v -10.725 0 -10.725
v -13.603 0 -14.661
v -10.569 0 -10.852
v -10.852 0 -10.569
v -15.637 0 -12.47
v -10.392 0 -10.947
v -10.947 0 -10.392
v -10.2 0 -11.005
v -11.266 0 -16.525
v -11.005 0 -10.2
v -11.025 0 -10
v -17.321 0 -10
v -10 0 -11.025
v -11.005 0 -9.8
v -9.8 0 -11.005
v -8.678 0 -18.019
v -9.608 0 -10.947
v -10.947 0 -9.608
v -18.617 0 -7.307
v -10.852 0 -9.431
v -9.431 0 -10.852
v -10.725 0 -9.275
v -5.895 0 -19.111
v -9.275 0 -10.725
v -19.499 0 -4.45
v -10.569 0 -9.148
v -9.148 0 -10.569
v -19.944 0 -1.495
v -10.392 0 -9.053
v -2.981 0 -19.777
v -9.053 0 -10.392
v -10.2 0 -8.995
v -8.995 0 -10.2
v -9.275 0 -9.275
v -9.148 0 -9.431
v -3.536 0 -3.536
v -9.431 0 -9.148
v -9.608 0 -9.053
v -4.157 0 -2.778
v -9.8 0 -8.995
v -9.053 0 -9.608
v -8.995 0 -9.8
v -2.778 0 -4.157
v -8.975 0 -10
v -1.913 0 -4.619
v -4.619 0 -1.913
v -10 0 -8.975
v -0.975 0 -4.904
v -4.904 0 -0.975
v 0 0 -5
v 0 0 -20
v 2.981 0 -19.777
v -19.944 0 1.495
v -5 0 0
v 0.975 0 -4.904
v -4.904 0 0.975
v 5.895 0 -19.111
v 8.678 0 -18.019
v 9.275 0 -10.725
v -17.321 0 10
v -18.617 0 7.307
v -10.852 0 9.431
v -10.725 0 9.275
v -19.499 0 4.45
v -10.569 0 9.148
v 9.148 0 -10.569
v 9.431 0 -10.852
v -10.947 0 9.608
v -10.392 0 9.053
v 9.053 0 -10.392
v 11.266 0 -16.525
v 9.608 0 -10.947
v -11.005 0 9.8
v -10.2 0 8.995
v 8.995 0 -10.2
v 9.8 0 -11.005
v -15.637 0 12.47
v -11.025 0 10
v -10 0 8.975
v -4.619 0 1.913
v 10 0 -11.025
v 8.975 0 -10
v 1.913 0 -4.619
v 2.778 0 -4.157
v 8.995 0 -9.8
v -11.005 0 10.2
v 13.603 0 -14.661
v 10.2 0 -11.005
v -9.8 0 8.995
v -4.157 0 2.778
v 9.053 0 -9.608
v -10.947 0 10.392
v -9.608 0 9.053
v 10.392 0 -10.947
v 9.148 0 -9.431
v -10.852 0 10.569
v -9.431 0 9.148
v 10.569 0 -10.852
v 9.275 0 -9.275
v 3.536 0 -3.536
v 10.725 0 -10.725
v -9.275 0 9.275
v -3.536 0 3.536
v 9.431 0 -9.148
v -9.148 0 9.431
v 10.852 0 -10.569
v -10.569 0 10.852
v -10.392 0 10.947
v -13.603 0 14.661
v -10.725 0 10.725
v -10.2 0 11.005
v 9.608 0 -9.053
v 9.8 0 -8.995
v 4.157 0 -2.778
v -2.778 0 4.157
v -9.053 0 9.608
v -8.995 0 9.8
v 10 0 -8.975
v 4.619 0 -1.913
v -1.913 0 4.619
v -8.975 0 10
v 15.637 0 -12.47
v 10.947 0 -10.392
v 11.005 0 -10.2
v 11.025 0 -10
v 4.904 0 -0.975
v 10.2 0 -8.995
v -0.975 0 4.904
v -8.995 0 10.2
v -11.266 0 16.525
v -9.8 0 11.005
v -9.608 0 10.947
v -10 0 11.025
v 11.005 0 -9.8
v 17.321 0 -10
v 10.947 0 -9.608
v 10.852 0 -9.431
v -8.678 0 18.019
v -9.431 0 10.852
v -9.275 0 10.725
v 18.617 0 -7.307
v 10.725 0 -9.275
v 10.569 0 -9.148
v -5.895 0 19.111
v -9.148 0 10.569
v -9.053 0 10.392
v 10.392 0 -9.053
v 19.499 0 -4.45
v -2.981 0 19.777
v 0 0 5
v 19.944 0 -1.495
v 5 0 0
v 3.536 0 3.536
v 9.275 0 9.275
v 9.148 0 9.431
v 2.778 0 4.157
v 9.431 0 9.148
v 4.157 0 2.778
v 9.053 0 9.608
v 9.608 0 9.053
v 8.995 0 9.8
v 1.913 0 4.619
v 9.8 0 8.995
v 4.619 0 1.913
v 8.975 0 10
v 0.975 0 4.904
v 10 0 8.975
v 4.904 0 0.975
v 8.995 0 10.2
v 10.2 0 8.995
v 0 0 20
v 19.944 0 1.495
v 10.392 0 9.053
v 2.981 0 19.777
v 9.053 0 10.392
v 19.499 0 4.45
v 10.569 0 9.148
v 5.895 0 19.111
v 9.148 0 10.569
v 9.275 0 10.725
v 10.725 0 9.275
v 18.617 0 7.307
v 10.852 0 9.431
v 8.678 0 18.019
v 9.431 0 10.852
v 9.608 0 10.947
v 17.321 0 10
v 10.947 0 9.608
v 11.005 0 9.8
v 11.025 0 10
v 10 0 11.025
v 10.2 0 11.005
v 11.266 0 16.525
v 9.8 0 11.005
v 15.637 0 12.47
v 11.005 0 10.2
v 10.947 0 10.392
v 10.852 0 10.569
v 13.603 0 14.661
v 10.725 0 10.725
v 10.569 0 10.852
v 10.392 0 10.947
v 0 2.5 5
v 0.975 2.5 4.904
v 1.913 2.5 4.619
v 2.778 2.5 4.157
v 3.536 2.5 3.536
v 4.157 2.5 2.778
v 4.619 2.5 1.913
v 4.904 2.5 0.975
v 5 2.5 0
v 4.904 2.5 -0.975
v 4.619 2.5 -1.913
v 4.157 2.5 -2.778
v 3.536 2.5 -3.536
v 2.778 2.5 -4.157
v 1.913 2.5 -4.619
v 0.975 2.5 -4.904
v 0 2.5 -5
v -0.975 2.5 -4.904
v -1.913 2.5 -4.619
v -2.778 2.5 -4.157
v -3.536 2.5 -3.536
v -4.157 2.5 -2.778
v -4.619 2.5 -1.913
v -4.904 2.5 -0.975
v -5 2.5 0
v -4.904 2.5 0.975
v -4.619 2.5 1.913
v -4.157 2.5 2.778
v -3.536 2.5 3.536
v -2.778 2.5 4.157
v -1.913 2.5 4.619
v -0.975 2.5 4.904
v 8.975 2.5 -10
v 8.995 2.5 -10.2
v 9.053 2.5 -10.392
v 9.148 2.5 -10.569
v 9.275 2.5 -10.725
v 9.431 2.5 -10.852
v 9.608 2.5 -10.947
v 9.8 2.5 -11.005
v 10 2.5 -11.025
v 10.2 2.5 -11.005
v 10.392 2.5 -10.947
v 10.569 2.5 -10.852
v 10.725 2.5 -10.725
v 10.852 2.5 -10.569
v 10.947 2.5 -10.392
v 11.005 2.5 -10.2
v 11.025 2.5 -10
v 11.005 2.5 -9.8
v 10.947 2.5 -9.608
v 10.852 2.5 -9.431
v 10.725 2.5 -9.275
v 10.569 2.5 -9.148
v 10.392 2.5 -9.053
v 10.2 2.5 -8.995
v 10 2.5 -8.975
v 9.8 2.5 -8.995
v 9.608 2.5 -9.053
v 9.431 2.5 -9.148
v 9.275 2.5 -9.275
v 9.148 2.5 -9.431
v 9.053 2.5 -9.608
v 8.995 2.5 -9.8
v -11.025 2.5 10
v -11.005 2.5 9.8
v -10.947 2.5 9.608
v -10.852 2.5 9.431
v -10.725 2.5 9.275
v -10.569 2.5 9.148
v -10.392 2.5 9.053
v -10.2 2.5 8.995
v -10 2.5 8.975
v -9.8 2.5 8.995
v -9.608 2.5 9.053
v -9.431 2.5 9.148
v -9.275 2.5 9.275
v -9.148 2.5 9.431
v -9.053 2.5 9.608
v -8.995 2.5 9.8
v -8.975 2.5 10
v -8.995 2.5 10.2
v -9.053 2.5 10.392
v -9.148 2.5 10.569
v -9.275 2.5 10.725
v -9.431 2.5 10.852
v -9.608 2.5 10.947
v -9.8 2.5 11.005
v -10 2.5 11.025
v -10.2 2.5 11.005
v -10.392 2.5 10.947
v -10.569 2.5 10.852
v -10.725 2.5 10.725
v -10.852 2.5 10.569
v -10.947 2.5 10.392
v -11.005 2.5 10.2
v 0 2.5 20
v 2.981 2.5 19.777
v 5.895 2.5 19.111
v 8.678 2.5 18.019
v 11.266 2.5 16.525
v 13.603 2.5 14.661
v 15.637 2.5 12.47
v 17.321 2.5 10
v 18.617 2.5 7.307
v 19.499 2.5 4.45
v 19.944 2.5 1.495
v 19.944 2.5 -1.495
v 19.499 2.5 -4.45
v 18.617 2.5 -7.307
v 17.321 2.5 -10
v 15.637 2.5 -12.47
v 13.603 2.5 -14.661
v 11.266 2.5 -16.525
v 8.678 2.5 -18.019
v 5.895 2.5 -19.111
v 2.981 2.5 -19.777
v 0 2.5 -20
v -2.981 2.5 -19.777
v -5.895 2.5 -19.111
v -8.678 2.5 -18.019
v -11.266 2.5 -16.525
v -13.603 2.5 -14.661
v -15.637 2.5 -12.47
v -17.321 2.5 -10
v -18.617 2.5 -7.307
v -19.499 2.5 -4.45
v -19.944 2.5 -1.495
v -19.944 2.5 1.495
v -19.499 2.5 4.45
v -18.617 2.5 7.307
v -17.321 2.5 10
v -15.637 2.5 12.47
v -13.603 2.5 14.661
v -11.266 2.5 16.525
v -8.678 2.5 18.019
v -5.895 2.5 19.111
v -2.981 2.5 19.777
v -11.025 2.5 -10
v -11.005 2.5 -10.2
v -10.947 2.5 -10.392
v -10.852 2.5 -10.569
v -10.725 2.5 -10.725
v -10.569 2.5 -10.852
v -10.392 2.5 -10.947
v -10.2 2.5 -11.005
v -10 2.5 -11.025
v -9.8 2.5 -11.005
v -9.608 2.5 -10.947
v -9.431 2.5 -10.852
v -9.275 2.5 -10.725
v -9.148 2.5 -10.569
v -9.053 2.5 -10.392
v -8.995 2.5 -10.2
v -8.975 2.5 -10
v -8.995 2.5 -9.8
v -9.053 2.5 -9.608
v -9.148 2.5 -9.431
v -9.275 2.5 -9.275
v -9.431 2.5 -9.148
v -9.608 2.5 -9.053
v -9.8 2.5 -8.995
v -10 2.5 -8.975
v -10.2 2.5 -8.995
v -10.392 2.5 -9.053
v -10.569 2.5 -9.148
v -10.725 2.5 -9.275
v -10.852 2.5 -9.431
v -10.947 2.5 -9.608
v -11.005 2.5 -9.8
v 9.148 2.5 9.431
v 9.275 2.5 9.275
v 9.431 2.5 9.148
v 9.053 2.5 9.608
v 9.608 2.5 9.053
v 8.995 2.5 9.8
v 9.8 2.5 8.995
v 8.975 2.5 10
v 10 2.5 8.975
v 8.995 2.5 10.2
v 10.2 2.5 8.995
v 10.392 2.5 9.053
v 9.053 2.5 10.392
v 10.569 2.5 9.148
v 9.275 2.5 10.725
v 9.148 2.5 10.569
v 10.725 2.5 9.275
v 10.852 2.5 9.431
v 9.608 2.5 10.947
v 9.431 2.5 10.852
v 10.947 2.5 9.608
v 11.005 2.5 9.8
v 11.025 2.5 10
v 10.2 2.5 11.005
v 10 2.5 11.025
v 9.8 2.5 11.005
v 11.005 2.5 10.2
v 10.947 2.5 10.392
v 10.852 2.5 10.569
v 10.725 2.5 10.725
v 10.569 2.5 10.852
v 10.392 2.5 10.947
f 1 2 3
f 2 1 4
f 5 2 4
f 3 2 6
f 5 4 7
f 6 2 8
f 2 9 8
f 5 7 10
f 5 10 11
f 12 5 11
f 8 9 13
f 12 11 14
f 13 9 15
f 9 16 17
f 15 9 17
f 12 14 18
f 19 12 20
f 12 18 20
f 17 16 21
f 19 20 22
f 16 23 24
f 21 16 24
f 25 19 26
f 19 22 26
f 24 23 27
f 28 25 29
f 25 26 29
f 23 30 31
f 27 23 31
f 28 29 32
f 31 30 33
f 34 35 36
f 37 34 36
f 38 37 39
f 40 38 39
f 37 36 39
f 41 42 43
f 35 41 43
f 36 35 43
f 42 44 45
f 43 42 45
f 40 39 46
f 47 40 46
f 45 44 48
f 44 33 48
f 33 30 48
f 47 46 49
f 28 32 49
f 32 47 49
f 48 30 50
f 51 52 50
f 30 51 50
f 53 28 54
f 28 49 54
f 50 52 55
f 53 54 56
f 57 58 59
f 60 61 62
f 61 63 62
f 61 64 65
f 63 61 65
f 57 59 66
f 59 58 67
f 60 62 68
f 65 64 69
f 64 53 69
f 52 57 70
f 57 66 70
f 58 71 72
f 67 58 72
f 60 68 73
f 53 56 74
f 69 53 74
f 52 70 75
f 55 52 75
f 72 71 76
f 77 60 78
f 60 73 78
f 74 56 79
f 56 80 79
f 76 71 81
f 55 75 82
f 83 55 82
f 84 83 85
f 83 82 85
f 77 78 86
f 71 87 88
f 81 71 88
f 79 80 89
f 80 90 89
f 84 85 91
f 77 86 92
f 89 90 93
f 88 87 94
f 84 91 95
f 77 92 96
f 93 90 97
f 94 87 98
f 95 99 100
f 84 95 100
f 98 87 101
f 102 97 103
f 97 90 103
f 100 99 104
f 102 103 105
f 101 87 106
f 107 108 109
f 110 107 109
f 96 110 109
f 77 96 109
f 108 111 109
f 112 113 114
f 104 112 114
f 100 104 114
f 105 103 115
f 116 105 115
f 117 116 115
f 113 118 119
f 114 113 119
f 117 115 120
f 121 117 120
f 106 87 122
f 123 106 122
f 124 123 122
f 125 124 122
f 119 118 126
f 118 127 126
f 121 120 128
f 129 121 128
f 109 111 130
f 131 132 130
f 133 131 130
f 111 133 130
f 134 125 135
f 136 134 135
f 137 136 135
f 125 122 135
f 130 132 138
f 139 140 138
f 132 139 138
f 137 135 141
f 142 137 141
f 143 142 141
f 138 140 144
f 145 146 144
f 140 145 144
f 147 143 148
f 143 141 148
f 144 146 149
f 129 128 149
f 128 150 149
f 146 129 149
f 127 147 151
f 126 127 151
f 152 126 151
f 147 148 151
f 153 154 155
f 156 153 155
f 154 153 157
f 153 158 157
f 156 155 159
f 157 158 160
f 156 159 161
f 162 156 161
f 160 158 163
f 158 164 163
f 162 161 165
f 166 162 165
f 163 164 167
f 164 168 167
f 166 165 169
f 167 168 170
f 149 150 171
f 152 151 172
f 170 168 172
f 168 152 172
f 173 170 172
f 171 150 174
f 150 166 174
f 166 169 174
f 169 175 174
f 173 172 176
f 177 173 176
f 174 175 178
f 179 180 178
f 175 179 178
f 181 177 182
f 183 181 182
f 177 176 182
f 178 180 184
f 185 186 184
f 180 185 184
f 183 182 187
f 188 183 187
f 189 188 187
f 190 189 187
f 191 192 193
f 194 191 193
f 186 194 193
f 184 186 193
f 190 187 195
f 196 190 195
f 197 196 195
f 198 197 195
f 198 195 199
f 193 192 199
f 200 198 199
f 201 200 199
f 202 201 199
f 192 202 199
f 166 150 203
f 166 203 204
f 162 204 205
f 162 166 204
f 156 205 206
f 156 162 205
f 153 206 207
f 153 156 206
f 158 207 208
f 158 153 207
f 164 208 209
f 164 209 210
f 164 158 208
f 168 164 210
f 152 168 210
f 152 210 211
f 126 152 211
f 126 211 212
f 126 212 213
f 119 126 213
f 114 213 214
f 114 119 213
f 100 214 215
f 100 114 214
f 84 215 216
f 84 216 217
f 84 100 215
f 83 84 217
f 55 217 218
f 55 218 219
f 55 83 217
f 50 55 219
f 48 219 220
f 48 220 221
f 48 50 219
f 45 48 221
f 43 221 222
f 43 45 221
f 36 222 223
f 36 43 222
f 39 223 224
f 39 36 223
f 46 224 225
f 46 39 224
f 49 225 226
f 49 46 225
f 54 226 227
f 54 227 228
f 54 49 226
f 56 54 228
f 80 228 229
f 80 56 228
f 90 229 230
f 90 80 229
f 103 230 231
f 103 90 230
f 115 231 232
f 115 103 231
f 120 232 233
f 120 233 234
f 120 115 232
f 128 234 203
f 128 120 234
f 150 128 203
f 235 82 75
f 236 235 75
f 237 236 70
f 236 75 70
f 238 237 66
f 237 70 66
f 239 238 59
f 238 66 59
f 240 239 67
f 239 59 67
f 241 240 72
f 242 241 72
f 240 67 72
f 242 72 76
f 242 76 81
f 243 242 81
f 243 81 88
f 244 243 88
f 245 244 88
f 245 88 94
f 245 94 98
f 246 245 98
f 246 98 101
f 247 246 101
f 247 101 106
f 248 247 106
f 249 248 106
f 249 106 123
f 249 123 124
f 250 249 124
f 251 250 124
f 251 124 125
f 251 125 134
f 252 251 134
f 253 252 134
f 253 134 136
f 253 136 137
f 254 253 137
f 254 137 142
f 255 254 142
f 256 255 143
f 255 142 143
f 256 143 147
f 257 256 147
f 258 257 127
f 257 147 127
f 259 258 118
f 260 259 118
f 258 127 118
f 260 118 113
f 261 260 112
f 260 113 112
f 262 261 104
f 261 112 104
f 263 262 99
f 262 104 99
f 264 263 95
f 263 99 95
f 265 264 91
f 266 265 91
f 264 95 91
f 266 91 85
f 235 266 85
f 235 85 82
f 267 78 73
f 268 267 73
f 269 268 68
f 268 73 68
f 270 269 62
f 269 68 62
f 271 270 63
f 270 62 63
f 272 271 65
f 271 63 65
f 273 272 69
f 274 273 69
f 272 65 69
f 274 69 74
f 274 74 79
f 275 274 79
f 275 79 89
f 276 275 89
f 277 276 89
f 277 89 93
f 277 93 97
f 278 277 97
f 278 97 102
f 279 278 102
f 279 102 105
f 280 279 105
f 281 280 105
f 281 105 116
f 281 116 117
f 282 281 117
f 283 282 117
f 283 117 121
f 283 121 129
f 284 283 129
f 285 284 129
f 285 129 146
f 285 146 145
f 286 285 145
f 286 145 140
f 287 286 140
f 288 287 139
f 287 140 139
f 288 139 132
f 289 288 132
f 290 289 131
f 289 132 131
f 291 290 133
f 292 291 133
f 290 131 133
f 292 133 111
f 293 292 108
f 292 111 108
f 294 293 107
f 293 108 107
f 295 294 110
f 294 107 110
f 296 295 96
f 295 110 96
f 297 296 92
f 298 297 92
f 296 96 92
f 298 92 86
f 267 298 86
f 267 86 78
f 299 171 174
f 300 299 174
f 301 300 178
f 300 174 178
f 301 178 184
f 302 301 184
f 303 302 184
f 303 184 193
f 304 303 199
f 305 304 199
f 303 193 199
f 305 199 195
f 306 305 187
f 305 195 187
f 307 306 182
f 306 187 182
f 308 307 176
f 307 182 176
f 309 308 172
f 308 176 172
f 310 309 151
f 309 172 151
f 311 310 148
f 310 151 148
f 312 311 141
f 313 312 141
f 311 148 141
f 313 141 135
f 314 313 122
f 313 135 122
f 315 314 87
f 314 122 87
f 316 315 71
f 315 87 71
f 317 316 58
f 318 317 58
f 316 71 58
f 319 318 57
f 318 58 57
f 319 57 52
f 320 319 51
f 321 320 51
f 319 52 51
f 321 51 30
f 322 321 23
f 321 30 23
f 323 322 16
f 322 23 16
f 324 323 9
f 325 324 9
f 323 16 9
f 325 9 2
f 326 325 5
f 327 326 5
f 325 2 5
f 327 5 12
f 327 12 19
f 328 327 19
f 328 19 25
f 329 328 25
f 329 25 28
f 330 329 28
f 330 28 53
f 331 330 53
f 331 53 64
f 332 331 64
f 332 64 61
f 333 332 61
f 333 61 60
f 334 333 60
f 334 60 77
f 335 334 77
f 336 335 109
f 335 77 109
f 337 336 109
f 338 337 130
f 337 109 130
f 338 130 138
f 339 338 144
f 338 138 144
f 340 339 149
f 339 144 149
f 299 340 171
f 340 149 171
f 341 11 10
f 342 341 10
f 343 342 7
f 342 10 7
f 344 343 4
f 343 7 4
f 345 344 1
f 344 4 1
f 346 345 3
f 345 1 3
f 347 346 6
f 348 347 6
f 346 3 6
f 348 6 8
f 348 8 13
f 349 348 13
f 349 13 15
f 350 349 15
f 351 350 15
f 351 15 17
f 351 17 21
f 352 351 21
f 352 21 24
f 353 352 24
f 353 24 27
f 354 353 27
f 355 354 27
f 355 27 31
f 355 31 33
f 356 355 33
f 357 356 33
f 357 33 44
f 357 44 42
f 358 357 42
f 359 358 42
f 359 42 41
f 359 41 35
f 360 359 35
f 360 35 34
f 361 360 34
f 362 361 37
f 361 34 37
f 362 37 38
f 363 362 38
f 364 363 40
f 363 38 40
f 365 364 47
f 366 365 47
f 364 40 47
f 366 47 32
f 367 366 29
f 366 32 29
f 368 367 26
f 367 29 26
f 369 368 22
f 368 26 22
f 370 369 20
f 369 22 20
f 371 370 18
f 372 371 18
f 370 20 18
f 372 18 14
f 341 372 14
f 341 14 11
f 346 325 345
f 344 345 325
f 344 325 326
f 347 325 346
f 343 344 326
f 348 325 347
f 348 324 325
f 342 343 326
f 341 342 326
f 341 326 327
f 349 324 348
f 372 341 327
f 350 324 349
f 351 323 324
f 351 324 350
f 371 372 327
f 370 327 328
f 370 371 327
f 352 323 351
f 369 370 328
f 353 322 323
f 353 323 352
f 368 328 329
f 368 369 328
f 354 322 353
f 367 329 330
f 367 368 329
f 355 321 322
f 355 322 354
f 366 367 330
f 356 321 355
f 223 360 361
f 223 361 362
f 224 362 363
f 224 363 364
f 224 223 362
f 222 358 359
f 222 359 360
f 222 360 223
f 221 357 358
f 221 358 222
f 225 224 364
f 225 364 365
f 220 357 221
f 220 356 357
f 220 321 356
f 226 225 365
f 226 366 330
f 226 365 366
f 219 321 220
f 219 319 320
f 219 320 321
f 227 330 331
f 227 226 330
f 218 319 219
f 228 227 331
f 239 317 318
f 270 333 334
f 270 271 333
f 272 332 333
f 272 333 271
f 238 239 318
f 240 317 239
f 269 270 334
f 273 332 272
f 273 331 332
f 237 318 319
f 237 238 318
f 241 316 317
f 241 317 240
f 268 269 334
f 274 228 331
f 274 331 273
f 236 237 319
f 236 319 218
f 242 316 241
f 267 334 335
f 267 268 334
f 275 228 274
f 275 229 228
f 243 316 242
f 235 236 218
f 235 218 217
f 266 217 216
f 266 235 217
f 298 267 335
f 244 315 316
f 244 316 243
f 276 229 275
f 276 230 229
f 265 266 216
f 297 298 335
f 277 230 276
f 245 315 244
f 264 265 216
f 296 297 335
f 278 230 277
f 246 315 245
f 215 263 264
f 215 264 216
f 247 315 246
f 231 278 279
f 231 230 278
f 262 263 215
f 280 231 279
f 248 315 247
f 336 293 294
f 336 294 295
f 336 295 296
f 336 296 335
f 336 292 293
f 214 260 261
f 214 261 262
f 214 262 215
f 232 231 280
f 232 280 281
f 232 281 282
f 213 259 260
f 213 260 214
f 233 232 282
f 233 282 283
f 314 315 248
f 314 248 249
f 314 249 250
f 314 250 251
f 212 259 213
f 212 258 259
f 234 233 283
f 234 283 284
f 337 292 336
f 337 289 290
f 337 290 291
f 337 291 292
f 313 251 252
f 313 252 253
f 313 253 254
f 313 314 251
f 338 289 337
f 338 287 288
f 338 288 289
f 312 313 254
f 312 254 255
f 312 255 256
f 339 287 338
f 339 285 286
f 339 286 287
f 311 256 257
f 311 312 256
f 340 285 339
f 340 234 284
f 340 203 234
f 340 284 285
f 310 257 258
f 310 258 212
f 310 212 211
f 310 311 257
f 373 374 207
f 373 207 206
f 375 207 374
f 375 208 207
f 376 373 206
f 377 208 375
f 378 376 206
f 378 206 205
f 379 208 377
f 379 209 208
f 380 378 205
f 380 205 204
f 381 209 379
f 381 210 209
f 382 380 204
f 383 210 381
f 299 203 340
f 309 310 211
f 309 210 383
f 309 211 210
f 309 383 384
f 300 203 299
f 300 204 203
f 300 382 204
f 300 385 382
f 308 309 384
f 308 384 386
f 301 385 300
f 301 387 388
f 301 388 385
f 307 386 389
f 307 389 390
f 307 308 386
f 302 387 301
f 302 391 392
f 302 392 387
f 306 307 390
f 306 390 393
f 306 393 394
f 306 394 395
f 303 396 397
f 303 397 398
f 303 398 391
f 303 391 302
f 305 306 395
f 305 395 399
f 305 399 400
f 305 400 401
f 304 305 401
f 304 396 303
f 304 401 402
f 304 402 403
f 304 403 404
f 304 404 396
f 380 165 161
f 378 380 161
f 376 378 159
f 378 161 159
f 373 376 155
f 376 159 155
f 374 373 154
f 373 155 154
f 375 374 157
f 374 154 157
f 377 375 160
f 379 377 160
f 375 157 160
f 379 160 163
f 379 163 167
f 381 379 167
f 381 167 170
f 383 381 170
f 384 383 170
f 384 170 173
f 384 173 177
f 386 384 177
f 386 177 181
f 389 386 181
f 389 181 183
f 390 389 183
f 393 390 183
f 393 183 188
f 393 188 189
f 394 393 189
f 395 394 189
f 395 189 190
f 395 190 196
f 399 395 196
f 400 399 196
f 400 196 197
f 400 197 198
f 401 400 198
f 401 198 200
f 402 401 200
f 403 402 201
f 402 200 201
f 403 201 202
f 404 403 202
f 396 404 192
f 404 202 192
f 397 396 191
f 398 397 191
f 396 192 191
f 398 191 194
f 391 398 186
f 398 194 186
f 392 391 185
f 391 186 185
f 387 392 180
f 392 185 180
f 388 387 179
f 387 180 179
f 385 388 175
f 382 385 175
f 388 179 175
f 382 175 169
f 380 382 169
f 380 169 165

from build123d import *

# Parameters (mm, degrees)
SKETCH_1_R          = 20
SKETCH_1_R_2        = 5
EXTRUDE_1_DEPTH     = 2.5
HOLE_WIZARD_M2_51_D = 2.05


with BuildPart() as part:
    # Эскиз1 → Бобышка-Вытянуть1 (new body)
    with BuildSketch(Plane(origin=(0, 0, 0), x_dir=(1, 0, 0), z_dir=(0, 1, 0))):
        with Locations(Location((0, 0, 0), (0, 0, 270))):
            Circle(SKETCH_1_R)
        with Locations(Location((0, 0, 0), (0, 0, 270))):
            Circle(SKETCH_1_R_2, mode=Mode.SUBTRACT)
    extrude(amount=EXTRUDE_1_DEPTH)

    # Отверстие обработанное метчиком M2.51 (through all)
    with Locations(Plane(origin=(0, 2.5, 0), x_dir=(1, 0, 0), z_dir=(0, 1, 0))):
        with Locations((-10, 10), (10, 10), (10, -10), (-10, -10)):
            Hole(HOLE_WIZARD_M2_51_D / 2)


solid = part.part
